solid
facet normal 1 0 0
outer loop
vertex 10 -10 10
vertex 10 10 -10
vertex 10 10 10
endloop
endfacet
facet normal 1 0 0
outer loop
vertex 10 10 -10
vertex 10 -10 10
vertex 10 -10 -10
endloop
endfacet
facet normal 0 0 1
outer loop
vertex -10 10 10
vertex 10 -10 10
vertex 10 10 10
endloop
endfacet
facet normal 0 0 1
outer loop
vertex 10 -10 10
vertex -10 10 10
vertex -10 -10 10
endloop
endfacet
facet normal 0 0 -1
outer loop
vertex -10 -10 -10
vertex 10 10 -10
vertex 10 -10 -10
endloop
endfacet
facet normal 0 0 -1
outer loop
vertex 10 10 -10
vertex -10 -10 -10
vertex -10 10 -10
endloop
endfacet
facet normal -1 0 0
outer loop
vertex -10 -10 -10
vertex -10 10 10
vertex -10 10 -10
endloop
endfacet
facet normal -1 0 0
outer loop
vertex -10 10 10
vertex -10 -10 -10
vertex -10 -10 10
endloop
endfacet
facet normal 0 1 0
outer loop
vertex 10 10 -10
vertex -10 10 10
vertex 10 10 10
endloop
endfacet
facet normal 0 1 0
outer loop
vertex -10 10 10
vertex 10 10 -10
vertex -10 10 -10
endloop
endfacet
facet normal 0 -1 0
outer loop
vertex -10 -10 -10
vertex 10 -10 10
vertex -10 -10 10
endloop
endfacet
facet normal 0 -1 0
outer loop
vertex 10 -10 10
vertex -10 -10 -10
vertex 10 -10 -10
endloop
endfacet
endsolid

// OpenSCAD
// Background Shapes - Test Fixture
// A body with a colored `%` plug and an uncolored `%` sphere inside a
// difference, and two `%` cubes beside it. tree.csg is the engine's CSG
// export of this file (OpenSCAD 2026.01.03).

module plug() color("SkyBlue", 0.35) cylinder(r = 3, h = 20, $fn = 24);
difference() {
    cube(20, center = true);
    translate([0, 0, -10]) %plug();
    %translate([0, 0, 8]) sphere(4, $fn = 16);
}
for (i = [0:1]) translate([30 + i * 10, 0, 0]) %cube(4);
